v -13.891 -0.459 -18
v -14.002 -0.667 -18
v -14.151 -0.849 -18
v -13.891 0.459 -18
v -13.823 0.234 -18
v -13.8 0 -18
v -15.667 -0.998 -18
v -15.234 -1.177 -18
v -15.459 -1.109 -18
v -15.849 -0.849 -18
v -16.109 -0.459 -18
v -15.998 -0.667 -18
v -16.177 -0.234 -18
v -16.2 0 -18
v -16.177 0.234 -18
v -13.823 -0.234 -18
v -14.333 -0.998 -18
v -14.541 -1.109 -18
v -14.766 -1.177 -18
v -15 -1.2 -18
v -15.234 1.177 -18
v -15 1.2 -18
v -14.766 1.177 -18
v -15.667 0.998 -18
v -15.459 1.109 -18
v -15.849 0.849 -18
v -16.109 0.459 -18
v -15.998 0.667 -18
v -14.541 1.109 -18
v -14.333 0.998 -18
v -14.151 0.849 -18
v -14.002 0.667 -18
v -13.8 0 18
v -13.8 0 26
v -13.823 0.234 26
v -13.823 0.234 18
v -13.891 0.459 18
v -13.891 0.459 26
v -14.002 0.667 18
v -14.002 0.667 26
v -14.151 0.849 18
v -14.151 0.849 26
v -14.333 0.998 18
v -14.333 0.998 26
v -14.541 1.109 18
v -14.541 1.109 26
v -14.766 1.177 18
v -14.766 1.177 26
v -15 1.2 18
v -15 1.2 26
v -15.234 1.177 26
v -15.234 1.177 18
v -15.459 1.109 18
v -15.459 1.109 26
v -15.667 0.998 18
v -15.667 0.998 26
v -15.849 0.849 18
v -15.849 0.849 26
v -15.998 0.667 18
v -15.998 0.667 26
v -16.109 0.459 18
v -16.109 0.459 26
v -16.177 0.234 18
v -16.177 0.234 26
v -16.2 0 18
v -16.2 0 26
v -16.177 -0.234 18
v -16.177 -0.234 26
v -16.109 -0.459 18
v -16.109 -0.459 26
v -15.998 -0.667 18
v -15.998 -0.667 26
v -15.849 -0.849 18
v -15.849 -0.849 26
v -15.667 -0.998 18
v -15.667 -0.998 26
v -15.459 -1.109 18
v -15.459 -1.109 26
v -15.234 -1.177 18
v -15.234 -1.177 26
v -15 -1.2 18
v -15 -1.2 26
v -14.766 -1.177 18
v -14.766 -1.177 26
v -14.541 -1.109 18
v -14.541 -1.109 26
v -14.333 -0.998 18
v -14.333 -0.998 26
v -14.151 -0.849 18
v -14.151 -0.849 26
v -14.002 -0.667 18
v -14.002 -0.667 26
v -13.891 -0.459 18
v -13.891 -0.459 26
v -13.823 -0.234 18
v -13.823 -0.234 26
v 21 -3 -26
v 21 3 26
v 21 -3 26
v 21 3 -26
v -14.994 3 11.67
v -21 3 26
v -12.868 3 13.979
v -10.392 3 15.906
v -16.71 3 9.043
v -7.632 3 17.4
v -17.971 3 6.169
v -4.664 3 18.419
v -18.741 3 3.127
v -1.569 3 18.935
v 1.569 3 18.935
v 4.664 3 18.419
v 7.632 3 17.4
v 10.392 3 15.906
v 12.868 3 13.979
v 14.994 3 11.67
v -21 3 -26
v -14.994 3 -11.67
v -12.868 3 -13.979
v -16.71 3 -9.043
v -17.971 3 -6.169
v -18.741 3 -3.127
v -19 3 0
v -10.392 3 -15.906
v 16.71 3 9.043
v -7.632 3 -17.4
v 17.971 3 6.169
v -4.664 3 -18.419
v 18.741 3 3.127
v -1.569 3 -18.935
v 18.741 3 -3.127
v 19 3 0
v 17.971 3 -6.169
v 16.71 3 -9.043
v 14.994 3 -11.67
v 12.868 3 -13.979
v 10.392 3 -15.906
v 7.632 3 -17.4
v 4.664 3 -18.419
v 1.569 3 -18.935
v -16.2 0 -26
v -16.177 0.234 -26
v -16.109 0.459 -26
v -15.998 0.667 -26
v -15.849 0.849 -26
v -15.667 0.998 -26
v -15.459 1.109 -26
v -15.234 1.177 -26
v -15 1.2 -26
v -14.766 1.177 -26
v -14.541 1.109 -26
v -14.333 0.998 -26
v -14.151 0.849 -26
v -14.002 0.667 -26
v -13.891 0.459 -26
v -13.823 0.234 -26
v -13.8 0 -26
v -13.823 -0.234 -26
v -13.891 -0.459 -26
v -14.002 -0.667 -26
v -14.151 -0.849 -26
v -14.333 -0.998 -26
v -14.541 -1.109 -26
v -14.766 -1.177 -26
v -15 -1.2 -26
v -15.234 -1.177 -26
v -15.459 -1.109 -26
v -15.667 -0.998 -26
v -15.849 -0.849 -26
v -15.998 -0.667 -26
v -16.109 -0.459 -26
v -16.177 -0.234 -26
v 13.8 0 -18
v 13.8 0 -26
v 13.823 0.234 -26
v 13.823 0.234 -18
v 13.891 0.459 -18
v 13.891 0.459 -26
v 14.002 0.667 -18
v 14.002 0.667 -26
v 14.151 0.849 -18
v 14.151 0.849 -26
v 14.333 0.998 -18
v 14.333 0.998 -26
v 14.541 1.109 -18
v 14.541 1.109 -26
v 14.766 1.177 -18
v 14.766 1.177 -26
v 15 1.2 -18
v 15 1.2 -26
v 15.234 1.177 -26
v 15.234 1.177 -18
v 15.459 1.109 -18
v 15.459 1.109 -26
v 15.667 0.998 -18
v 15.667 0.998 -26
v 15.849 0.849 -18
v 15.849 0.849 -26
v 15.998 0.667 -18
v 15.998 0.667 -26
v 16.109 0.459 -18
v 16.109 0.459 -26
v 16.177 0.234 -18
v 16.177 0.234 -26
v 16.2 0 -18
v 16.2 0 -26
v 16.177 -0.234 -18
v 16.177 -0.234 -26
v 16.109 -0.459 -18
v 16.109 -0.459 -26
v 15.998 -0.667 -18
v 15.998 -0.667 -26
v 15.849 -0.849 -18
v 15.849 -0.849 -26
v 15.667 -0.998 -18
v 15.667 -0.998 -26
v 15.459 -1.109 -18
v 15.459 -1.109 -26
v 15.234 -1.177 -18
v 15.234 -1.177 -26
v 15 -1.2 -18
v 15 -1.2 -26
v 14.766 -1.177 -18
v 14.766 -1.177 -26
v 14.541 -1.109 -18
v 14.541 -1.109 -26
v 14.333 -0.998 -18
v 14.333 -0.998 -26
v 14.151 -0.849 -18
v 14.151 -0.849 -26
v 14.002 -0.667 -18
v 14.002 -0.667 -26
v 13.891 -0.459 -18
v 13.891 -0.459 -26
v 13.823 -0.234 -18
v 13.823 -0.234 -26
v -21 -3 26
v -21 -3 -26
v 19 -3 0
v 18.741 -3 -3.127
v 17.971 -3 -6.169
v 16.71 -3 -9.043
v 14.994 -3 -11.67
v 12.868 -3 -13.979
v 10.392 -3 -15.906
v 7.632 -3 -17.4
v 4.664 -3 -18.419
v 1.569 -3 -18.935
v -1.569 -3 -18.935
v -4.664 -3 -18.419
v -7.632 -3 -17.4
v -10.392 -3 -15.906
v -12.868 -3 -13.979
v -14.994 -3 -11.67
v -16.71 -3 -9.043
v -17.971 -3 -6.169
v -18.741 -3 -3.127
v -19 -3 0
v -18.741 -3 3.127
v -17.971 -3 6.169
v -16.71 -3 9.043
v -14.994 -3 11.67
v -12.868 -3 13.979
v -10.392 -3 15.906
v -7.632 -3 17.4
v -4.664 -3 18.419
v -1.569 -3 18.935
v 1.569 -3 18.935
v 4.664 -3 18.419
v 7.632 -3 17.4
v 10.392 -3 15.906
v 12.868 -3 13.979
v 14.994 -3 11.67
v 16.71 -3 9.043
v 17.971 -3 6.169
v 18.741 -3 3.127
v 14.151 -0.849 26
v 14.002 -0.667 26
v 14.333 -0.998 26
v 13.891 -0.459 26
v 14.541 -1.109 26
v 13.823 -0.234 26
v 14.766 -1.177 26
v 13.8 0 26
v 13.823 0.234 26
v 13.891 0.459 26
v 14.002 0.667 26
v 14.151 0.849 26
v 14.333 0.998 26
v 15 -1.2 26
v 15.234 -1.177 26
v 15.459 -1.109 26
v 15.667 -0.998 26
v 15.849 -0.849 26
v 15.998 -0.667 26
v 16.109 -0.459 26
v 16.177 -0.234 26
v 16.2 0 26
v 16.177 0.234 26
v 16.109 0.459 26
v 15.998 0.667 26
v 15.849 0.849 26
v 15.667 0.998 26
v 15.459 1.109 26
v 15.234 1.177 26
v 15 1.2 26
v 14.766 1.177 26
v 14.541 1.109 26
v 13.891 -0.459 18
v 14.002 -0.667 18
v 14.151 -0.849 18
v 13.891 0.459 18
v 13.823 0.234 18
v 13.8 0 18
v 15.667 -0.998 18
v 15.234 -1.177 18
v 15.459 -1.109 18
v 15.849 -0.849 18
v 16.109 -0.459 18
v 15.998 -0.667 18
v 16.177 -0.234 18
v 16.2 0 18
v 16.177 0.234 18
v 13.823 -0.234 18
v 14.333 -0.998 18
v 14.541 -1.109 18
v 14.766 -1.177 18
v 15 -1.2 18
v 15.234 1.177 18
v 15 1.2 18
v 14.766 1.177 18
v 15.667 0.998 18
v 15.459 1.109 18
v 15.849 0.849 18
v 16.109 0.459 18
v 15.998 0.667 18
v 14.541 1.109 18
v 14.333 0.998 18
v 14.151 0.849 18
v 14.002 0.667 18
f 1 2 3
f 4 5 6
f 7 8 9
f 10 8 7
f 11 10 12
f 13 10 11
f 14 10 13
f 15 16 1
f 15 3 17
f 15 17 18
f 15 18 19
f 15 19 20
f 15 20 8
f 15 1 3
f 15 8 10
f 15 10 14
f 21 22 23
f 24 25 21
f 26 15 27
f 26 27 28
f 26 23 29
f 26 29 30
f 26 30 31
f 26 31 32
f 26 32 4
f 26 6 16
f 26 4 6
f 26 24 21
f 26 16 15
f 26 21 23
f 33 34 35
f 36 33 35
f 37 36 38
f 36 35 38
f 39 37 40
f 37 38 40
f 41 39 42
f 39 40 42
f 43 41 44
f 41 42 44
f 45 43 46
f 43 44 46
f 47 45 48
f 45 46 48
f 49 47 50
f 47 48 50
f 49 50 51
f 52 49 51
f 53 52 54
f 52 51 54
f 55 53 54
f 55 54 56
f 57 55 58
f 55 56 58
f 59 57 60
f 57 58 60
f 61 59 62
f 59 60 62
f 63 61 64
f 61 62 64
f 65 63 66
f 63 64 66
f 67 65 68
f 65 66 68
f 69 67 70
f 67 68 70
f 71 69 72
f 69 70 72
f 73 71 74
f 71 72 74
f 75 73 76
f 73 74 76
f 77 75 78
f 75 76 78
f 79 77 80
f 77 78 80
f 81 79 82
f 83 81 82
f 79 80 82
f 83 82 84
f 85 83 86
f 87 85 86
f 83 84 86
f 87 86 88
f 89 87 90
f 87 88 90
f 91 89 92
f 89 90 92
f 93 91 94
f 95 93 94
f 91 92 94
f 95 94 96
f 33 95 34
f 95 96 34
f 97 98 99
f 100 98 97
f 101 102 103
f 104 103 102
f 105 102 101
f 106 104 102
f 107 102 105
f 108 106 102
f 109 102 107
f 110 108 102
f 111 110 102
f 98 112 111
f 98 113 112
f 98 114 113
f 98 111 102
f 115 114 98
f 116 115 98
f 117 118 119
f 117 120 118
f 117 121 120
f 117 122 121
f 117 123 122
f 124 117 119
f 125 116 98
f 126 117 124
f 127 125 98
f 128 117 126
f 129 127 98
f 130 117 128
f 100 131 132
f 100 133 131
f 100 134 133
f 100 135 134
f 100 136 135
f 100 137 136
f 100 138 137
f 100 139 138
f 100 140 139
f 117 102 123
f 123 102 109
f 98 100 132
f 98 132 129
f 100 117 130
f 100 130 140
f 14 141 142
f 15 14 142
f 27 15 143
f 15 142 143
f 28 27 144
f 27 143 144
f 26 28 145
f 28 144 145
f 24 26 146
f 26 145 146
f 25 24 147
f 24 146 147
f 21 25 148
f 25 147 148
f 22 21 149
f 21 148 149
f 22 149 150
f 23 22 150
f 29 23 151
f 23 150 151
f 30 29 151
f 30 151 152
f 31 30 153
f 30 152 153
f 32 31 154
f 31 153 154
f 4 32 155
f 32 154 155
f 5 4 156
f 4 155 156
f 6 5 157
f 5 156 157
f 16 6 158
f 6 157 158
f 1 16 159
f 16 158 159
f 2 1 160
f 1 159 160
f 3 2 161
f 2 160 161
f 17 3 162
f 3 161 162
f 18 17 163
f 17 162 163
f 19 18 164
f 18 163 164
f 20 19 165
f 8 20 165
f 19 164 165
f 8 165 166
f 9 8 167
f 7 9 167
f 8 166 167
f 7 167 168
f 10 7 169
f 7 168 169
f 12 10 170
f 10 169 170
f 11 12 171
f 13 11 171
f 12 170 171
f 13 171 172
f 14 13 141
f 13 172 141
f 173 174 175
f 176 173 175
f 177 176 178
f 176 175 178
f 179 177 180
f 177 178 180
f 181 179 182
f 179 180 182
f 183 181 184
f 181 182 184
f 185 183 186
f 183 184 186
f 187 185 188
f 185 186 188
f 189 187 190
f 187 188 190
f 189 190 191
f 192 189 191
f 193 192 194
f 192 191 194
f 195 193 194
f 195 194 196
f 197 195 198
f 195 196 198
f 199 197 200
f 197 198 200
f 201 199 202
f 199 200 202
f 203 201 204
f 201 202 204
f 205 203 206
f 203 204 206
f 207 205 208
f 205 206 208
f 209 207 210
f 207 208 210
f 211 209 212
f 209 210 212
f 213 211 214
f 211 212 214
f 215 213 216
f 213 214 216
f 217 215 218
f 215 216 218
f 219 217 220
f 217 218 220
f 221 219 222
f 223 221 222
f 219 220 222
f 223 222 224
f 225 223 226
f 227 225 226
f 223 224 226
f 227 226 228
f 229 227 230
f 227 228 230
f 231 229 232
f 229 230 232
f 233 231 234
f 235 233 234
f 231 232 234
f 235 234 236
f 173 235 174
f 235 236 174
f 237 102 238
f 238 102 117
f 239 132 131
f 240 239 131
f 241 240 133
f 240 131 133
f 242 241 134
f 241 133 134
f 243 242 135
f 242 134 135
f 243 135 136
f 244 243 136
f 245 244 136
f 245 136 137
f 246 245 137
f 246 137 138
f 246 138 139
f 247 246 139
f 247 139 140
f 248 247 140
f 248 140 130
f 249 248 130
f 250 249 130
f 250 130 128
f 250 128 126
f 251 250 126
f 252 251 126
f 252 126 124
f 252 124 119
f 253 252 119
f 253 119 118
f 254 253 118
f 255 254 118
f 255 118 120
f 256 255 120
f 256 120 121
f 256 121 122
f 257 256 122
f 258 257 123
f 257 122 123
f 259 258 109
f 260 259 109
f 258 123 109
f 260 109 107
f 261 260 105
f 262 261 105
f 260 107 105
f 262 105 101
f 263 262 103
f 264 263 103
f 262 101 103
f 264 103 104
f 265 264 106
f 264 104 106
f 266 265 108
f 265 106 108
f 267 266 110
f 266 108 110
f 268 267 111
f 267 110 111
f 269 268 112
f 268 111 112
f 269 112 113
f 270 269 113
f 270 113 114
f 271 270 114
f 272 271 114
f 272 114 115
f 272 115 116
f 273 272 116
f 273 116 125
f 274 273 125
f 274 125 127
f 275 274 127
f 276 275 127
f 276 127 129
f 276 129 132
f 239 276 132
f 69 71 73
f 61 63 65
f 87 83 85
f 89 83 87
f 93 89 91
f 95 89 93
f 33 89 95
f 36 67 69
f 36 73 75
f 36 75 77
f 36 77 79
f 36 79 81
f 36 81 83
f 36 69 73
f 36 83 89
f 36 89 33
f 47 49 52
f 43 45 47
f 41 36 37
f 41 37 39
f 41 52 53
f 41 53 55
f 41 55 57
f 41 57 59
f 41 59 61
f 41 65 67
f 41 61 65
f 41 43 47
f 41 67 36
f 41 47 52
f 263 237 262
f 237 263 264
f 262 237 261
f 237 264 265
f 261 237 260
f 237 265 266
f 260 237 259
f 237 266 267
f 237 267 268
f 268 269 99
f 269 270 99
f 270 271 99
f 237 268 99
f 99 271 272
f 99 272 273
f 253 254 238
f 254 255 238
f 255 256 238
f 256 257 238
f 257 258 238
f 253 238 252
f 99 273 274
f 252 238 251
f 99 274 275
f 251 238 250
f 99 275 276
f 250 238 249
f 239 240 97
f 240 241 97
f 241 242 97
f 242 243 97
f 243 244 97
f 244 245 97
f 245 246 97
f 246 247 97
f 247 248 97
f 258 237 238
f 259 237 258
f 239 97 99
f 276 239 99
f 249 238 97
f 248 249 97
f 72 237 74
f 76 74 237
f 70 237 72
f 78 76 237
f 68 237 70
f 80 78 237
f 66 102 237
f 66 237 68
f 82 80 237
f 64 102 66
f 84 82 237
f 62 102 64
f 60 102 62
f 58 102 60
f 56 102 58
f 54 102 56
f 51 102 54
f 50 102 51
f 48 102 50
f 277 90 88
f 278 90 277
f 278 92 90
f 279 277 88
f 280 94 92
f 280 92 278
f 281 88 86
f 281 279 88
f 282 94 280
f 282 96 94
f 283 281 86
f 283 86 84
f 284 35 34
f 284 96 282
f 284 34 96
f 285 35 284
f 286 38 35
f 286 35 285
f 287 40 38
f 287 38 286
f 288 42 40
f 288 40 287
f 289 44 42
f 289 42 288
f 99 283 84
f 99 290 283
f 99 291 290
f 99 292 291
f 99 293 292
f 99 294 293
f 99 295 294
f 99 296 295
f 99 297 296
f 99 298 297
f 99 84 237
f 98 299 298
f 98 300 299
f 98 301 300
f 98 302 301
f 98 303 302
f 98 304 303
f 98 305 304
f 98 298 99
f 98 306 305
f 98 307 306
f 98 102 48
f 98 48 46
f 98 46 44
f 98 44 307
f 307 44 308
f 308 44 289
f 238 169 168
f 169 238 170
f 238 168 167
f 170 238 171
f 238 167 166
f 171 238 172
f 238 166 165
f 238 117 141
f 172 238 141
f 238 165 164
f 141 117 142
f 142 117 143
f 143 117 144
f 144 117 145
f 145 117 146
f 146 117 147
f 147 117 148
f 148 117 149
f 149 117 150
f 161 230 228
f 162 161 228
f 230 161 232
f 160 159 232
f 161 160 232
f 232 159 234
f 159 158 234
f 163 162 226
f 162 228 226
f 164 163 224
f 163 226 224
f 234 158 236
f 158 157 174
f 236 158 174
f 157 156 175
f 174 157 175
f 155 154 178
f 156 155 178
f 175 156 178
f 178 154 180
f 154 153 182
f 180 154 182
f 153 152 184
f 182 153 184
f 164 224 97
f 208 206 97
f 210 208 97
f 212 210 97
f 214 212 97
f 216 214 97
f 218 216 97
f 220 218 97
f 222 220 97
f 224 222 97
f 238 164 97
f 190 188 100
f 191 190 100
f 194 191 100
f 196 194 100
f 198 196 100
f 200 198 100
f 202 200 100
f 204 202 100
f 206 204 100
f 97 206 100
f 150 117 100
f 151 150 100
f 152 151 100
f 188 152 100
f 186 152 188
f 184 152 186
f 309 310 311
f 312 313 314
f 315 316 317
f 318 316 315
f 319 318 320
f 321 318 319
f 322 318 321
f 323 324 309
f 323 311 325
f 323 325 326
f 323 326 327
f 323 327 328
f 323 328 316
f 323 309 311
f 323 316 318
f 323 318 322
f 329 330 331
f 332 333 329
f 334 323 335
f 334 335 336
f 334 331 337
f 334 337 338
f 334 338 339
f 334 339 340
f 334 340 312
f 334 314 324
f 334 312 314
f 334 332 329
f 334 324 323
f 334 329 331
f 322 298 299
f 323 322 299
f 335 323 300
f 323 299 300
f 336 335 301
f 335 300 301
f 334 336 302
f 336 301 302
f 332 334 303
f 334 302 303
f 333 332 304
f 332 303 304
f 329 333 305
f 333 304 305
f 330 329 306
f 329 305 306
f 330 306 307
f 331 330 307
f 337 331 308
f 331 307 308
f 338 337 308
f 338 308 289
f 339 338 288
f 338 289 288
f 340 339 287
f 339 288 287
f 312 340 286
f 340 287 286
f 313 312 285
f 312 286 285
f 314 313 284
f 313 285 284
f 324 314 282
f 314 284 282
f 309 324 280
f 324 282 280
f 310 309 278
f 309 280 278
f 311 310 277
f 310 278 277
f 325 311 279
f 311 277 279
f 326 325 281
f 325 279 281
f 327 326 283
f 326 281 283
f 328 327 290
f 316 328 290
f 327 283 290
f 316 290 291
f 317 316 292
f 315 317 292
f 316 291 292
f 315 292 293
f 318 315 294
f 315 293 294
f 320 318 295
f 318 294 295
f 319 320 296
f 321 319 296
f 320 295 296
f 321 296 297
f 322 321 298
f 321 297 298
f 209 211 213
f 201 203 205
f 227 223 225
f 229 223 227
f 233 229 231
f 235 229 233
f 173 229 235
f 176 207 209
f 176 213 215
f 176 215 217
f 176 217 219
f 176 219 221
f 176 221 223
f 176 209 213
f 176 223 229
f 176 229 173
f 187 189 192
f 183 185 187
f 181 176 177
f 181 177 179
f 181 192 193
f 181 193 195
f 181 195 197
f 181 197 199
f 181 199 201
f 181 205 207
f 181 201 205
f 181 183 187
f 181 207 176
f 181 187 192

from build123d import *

# Parameters (mm, degrees)
SKETCH1_W           = 42
SKETCH1_H           = 52
BOSS_EXTRUDE1_DEPTH = 3
SKETCH2_R           = 19
CUT_EXTRUDE1_DEPTH  = 7
SKETCH3_R           = 1.2
CUT_EXTRUDE2_DEPTH  = 8
SKETCH4_R           = 1.2
CUT_EXTRUDE3_DEPTH  = 8


with BuildPart() as part:
    # Sketch1 → Boss-Extrude1 (new body, symmetric)
    with BuildSketch(Plane(origin=(0, 0, 0), x_dir=(1, 0, 0), z_dir=(0, 1, 0))):
        Rectangle(SKETCH1_W, SKETCH1_H)
    extrude(amount=BOSS_EXTRUDE1_DEPTH, both=True)

    # Sketch2 → Cut-Extrude1 (cut, through all)
    with BuildSketch(Plane(origin=(0, 3, 0), x_dir=(1, 0, 0), z_dir=(0, 1, 0))):
        Circle(SKETCH2_R)
    extrude(amount=-CUT_EXTRUDE1_DEPTH, mode=Mode.SUBTRACT)

    # Sketch3 → Cut-Extrude2 (cut)
    with BuildSketch(Plane(origin=(0, 0, -26), x_dir=(-1, 0, 0), z_dir=(0, 0, -1))):
        with Locations((-15, 0)):
            Circle(SKETCH3_R)
        with Locations((15, 0)):
            Circle(SKETCH3_R)
    extrude(amount=-CUT_EXTRUDE2_DEPTH, mode=Mode.SUBTRACT)

    # Sketch4 → Cut-Extrude3 (cut)
    with BuildSketch(Plane.XY.offset(26)):
        with Locations((15, 0)):
            Circle(SKETCH4_R)
        with Locations((-15, 0)):
            Circle(SKETCH4_R)
    extrude(amount=-CUT_EXTRUDE3_DEPTH, mode=Mode.SUBTRACT)


solid = part.part
